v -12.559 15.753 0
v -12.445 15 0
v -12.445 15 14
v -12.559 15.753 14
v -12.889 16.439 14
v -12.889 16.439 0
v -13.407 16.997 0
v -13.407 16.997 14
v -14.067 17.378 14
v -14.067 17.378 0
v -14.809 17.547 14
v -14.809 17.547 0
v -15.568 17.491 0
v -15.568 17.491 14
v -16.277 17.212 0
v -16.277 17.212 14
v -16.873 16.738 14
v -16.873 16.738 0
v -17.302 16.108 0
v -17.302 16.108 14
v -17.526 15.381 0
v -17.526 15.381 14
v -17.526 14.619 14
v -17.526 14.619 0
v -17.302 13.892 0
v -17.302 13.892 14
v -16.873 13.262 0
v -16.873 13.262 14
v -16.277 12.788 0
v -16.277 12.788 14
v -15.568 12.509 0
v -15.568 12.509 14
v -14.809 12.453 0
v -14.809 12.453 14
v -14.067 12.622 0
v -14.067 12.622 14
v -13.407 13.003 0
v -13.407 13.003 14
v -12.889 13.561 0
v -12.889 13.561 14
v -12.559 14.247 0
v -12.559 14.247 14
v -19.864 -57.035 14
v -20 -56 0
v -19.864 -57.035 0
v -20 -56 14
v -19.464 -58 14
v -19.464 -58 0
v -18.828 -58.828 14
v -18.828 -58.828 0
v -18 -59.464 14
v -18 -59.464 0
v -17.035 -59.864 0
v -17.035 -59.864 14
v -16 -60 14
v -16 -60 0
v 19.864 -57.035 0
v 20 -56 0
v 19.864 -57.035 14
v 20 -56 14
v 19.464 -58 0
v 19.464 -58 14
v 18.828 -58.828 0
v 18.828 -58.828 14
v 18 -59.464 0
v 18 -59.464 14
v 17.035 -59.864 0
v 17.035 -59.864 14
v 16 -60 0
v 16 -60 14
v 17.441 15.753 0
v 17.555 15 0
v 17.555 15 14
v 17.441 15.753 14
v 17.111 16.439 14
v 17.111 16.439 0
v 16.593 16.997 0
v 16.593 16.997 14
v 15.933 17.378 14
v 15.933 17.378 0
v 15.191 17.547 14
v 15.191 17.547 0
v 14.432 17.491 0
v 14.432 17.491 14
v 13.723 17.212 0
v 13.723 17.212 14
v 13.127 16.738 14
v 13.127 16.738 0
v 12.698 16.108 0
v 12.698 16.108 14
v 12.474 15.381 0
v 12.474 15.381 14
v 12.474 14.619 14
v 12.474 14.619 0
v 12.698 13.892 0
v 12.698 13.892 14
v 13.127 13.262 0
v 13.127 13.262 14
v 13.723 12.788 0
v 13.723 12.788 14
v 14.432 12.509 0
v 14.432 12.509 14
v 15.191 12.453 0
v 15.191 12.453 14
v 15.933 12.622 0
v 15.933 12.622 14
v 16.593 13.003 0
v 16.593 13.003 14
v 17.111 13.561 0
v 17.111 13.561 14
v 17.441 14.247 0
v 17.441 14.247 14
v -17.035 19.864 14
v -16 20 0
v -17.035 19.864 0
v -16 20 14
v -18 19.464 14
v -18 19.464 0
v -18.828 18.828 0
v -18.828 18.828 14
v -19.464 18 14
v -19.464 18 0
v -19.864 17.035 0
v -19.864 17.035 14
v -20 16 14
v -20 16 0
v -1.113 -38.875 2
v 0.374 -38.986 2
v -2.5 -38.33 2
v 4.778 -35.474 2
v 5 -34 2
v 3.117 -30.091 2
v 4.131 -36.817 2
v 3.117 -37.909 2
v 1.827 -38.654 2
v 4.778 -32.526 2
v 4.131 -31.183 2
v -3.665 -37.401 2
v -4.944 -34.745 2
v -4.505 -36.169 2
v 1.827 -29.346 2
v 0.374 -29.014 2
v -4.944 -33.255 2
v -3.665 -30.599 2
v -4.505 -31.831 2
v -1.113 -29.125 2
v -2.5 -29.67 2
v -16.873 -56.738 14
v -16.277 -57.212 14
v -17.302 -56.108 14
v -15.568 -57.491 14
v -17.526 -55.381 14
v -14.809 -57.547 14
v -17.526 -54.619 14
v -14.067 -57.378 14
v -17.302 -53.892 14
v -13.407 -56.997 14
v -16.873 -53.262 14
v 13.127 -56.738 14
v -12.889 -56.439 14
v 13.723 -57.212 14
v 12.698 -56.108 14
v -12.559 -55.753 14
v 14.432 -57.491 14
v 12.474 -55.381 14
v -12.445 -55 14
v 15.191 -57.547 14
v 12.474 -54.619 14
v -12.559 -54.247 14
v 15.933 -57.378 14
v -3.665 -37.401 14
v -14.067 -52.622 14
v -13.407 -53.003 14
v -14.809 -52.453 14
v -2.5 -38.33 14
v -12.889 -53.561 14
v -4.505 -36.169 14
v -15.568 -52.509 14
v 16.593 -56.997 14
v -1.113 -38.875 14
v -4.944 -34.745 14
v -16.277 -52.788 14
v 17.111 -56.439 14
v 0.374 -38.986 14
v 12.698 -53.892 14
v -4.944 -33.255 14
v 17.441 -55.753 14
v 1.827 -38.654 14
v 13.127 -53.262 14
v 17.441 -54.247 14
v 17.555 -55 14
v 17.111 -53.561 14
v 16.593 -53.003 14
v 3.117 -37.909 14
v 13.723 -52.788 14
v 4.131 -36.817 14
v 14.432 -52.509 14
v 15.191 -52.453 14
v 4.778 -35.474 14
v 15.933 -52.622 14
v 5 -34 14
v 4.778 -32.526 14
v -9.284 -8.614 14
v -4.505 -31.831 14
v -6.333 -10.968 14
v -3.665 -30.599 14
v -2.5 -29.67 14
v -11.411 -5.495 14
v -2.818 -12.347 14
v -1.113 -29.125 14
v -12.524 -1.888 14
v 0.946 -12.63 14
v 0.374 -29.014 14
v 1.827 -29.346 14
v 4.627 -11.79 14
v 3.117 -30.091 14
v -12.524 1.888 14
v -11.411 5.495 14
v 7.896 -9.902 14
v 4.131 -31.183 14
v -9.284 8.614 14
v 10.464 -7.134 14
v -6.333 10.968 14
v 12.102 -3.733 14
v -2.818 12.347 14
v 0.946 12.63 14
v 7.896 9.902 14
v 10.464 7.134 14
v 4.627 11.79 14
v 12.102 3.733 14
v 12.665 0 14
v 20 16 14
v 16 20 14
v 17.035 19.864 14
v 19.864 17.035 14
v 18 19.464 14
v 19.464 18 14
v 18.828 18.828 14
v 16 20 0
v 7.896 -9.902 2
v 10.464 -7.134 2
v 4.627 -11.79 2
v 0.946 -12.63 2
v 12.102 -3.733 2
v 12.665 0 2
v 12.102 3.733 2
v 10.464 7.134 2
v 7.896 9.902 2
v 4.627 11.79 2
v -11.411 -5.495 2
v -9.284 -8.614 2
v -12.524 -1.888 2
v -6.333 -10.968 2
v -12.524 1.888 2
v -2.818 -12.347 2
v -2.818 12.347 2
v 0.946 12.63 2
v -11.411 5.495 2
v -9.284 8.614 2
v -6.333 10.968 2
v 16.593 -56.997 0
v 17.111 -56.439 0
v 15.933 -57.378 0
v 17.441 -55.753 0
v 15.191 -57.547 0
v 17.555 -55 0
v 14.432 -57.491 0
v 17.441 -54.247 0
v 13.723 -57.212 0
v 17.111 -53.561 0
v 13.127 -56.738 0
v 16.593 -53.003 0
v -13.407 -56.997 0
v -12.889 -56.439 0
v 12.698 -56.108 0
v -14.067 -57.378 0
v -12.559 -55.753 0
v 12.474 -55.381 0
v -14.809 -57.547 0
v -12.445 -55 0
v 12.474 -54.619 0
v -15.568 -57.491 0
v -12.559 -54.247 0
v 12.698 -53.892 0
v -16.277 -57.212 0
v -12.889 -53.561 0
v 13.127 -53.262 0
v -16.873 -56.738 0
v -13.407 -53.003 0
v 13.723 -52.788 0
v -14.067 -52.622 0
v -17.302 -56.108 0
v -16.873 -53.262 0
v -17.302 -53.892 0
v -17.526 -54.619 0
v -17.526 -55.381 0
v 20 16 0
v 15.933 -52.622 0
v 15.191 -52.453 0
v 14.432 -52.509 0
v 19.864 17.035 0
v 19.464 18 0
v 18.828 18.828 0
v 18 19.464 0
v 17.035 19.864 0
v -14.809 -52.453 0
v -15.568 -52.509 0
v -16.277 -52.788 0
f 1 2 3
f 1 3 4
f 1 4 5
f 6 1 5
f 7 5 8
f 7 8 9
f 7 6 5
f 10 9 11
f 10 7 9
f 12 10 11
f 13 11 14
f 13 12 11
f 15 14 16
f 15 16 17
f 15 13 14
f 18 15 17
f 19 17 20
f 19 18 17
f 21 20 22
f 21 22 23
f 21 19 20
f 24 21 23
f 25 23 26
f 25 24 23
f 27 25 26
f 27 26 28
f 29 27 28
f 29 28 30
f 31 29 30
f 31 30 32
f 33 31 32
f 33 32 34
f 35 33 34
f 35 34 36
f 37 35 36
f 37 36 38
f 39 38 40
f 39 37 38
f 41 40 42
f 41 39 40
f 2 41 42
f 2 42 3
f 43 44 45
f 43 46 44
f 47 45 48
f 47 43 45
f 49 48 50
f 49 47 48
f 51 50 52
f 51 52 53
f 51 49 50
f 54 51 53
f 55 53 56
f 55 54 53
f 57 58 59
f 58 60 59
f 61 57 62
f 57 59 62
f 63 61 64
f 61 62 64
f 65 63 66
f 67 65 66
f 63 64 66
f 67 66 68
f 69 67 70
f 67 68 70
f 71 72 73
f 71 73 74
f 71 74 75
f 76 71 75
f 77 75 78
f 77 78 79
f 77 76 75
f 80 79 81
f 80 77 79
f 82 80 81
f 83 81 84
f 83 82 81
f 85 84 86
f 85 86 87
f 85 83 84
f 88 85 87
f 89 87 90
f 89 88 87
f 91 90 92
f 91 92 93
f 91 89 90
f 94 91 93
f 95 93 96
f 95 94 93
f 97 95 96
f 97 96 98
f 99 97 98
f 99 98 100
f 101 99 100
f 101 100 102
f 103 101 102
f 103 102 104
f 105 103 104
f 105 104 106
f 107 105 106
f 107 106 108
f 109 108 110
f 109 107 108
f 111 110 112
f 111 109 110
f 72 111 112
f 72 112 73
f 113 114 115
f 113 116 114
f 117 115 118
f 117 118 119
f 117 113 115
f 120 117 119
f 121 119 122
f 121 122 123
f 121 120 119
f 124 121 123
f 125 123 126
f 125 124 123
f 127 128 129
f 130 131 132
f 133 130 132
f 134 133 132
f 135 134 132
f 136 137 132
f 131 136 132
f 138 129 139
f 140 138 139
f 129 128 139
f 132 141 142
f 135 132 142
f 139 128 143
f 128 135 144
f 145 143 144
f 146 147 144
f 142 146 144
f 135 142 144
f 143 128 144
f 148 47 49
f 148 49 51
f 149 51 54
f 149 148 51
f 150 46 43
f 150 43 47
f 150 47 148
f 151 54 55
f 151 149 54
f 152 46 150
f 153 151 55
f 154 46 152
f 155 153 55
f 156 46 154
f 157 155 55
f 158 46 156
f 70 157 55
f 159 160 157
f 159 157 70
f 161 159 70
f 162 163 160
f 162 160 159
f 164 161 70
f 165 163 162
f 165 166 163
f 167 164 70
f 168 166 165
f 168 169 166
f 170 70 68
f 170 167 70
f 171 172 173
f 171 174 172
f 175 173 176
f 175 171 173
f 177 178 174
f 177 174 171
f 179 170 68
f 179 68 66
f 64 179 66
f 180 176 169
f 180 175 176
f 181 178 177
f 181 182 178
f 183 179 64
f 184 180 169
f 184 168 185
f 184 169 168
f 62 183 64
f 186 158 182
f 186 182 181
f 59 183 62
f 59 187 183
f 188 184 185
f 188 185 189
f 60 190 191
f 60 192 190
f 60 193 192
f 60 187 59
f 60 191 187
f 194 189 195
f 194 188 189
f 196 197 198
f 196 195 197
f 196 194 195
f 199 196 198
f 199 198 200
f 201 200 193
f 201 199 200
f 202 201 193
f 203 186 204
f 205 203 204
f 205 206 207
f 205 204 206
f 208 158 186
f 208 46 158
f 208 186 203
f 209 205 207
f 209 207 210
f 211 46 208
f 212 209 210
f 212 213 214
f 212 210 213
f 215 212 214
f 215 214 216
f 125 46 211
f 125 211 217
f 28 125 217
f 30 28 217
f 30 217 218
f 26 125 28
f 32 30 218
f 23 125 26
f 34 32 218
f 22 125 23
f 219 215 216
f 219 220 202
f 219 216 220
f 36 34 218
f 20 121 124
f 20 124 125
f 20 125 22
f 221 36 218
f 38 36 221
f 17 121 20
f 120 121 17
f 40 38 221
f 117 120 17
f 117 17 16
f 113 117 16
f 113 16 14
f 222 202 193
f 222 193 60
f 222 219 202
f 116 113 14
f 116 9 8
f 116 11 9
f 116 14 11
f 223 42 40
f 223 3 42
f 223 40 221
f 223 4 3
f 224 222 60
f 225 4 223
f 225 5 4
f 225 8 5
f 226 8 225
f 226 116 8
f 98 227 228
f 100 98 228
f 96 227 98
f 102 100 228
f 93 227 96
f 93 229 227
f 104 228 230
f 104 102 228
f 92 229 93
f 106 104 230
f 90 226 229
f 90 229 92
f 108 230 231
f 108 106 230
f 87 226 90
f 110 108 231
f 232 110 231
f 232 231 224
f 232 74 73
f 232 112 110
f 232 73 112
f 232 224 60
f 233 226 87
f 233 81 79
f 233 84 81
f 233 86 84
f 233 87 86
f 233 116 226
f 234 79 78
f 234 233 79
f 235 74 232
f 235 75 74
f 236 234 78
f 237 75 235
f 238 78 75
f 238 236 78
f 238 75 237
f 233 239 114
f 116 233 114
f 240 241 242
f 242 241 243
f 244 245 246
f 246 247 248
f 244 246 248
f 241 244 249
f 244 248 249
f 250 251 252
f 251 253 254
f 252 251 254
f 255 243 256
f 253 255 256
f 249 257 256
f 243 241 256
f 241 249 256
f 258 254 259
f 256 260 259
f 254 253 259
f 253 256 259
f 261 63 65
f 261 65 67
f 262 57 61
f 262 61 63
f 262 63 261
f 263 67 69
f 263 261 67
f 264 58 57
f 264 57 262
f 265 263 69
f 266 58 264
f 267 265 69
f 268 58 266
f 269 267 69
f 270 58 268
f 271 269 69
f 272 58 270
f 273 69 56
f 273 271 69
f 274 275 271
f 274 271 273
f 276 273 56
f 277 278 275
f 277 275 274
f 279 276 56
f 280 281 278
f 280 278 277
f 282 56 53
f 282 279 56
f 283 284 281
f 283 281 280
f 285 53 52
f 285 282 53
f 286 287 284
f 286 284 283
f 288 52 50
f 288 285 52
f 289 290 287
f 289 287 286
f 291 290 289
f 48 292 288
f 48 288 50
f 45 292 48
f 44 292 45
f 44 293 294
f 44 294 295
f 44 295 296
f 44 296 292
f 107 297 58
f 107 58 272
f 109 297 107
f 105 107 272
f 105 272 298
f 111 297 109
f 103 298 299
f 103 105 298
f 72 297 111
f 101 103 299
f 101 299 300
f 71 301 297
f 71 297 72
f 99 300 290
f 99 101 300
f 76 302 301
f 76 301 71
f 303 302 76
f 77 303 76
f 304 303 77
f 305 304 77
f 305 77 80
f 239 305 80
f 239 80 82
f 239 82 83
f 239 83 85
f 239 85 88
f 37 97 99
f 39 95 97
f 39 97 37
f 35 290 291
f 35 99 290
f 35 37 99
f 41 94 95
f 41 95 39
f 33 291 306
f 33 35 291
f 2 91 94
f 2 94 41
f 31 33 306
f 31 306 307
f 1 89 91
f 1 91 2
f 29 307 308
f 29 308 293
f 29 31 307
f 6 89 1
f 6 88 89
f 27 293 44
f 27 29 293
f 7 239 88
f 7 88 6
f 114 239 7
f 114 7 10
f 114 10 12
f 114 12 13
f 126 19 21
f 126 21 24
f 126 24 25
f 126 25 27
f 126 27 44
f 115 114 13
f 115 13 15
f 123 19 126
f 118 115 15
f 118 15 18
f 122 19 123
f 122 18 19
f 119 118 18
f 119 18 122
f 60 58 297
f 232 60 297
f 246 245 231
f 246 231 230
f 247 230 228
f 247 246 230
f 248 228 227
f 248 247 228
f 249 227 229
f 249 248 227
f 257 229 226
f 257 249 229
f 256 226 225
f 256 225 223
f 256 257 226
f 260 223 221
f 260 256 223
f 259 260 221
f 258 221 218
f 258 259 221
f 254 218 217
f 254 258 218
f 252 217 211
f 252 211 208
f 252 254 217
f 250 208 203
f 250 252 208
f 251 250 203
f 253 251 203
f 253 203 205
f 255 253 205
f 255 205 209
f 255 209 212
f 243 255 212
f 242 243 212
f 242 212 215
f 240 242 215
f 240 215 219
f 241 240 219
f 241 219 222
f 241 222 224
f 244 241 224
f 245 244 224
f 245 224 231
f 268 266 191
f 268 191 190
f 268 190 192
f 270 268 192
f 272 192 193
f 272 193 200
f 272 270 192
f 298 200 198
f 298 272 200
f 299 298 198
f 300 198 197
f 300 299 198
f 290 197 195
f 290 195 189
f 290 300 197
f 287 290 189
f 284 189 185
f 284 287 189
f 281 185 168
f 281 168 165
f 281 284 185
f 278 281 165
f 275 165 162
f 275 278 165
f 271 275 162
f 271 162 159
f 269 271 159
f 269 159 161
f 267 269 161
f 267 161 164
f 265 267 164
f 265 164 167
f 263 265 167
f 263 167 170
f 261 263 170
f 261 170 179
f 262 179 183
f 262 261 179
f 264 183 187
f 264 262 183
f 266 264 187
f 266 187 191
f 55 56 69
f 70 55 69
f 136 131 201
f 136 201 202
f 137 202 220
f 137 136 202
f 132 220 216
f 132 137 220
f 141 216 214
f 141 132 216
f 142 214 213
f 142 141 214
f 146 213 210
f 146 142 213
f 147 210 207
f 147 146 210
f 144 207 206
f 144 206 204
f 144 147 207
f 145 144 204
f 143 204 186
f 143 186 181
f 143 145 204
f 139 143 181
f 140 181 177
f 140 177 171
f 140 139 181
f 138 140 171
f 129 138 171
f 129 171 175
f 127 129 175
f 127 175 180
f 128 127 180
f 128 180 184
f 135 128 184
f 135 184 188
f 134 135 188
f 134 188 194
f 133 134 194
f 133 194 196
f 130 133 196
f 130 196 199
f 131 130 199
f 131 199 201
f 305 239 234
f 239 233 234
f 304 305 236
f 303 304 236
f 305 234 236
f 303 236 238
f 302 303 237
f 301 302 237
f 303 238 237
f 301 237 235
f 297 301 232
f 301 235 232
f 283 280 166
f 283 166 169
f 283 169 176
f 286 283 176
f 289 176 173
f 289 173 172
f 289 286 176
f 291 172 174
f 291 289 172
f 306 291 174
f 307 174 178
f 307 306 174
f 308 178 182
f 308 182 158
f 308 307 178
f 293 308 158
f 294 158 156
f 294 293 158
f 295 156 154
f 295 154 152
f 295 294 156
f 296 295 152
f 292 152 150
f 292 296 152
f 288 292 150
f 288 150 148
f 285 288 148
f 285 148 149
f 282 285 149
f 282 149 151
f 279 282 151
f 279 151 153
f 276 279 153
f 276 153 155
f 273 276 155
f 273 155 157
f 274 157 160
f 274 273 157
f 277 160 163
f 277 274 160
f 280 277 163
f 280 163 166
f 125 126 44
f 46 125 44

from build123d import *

# Parameters (mm, degrees)
SKETCH1_R           = 12.665
SKETCH1_R_2         = 2.554599
SKETCH1_R_3         = 5
BOSS_EXTRUDE1_DEPTH = 14
FILLET1_R           = 4
SKETCH9_R           = 12.665
BOSS_EXTRUDE2_DEPTH = 2
SKETCH11_R          = 7.5
BOSS_EXTRUDE3_DEPTH = 2


with BuildPart() as part:
    # Sketch1 → Boss-Extrude1 (new body)
    with BuildSketch(Plane.XY):
        Polygon((20, -10), (20, 20), (-20, 20), (-20, -10), (-20, -60), (20, -60), align=None)
        Circle(SKETCH1_R, mode=Mode.SUBTRACT)
        with Locations((-15, 15)):
            Circle(SKETCH1_R_2, mode=Mode.SUBTRACT)
        with Locations((15, 15)):
            Circle(SKETCH1_R_2, mode=Mode.SUBTRACT)
        with Locations((-15, -55)):
            Circle(SKETCH1_R_2, mode=Mode.SUBTRACT)
        with Locations((15, -55)):
            Circle(SKETCH1_R_2, mode=Mode.SUBTRACT)
        with Locations((0, -34)):
            Circle(SKETCH1_R_3, mode=Mode.SUBTRACT)
    extrude(amount=BOSS_EXTRUDE1_DEPTH)

    # Fillet1
    fillet1_edges = [part.edges().sort_by_distance(p)[0] for p in [
        (-20, 20, 7),
        (20, 20, 7),
        (20, -60, 7),
        (-20, -60, 7),
    ]]
    fillet(fillet1_edges, radius=FILLET1_R)

    # Sketch9 → Boss-Extrude2 (add)
    with BuildSketch(Plane(origin=(0, 0, 0), x_dir=(-1, 0, 0), z_dir=(0, 0, -1))):
        Circle(SKETCH9_R)
    extrude(amount=-BOSS_EXTRUDE2_DEPTH)

    # Sketch11 → Boss-Extrude3 (add)
    with BuildSketch(Plane(origin=(0, 0, 0), x_dir=(-1, 0, 0), z_dir=(0, 0, -1))):
        with Locations((0, -34)):
            Circle(SKETCH11_R)
    extrude(amount=-BOSS_EXTRUDE3_DEPTH)


solid = part.part
